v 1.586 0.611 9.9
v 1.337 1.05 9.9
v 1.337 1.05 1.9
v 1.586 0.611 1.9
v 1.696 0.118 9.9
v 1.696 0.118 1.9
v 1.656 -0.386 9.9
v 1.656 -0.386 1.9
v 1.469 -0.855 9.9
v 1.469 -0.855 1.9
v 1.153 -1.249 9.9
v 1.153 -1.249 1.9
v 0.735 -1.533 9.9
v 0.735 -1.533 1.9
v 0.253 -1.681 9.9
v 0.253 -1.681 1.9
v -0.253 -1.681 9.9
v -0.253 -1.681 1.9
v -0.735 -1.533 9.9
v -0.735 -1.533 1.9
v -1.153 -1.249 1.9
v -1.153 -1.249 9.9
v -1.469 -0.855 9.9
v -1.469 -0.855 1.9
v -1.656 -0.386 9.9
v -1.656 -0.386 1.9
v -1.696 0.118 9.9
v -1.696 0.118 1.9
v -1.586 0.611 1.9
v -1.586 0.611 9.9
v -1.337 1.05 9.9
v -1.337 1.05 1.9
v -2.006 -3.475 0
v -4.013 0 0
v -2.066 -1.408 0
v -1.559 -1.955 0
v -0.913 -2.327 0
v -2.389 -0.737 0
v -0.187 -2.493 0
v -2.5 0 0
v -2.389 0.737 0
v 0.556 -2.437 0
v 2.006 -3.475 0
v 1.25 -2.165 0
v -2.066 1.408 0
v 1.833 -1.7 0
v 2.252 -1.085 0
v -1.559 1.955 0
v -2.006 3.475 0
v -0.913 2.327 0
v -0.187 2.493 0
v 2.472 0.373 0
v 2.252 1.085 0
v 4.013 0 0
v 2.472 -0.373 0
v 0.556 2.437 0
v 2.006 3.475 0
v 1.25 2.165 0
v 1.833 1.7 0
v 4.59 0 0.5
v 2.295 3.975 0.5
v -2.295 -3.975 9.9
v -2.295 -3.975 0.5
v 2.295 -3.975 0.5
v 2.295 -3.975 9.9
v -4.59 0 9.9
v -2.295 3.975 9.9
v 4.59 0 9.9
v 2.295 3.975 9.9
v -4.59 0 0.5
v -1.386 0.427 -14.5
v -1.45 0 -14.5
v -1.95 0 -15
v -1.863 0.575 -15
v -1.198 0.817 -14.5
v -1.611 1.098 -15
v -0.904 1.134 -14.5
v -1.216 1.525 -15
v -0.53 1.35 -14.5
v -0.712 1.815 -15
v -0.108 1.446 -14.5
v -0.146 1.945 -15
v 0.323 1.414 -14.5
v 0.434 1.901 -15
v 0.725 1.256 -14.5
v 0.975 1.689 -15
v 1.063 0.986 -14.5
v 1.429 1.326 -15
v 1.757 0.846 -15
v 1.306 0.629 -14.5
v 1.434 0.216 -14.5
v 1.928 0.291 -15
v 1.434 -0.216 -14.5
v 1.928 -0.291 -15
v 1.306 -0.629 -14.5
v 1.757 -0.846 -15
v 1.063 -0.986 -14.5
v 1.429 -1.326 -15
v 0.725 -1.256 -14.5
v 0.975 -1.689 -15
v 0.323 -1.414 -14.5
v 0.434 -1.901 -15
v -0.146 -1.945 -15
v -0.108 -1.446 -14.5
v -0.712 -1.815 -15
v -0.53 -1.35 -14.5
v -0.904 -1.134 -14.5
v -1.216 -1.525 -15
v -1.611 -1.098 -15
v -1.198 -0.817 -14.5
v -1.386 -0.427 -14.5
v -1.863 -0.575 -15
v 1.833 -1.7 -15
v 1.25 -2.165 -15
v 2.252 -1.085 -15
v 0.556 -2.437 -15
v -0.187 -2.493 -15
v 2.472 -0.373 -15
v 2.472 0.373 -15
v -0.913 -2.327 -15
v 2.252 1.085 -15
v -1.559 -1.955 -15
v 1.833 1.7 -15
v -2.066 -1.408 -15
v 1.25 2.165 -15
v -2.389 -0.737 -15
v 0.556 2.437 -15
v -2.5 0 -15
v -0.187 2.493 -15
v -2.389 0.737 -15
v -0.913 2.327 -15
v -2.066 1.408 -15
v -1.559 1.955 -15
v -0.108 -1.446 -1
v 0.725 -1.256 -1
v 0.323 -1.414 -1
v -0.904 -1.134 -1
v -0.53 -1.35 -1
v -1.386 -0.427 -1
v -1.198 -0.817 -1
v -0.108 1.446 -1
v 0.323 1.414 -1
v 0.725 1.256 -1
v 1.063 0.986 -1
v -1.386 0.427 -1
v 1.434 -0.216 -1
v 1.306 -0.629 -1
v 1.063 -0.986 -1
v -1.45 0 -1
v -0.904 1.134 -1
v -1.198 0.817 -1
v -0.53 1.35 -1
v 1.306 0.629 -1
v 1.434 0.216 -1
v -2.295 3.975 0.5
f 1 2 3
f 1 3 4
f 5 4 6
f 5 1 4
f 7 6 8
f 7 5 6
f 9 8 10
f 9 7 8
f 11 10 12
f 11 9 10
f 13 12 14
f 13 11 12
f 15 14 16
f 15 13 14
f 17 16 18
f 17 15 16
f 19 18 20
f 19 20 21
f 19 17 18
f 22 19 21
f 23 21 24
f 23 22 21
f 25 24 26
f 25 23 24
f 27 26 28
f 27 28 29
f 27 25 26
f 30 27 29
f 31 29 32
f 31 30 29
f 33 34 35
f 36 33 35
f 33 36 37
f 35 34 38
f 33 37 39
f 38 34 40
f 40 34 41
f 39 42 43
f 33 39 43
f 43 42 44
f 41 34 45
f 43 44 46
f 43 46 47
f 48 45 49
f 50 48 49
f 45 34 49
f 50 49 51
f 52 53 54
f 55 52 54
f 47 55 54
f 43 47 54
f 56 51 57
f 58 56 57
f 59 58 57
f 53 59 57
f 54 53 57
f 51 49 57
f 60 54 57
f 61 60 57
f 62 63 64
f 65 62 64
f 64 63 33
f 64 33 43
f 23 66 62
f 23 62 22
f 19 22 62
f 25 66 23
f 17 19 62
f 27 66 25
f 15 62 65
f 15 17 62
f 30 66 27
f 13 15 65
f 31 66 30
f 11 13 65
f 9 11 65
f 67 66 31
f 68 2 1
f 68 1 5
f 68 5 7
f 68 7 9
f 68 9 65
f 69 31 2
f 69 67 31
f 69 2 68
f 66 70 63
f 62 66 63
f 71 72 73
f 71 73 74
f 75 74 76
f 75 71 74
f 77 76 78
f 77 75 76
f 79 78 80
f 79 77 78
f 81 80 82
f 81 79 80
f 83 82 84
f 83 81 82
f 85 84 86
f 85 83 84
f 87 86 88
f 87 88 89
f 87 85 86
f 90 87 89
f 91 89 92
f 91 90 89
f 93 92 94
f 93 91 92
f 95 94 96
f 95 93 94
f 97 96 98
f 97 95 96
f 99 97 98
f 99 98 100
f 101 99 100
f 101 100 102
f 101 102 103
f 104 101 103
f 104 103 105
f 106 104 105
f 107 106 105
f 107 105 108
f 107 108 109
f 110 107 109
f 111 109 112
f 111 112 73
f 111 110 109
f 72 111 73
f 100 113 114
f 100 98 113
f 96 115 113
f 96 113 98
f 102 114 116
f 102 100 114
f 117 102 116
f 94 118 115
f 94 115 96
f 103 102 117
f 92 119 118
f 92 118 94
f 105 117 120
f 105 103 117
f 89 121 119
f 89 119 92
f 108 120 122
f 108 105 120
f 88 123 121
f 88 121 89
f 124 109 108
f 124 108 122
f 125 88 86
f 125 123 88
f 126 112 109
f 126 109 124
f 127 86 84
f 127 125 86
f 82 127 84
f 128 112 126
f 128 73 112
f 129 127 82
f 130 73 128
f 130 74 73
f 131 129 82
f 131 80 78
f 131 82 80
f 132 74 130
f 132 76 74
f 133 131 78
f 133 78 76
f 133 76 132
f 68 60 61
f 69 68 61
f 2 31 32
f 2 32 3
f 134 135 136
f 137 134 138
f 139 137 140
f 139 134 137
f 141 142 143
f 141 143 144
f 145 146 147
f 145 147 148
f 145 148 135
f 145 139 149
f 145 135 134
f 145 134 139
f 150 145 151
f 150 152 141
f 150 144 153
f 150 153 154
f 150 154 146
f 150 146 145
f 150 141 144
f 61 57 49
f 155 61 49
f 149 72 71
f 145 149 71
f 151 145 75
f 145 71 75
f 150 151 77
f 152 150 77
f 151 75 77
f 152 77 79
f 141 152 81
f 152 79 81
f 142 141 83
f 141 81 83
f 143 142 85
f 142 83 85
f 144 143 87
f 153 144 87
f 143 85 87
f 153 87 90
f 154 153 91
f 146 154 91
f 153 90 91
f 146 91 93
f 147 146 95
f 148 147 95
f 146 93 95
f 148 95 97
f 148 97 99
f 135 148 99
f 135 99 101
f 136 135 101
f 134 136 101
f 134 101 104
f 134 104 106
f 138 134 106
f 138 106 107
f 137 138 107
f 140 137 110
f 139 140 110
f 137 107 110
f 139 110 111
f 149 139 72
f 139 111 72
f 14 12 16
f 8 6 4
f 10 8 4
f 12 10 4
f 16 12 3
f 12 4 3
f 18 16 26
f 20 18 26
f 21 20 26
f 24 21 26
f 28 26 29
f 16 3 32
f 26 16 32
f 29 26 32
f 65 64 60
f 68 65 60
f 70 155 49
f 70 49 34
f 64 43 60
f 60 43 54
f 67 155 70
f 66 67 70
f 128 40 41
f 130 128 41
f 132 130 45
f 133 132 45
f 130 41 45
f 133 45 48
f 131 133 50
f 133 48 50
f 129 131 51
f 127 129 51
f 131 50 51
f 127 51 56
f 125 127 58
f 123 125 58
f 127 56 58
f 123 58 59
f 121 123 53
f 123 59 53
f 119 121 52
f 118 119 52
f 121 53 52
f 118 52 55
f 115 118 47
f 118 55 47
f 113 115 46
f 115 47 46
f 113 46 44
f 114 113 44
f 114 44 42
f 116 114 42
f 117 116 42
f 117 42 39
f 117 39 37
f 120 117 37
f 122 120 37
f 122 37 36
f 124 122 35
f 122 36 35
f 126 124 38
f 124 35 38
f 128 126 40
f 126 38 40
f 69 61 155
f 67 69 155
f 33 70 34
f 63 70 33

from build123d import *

# Parameters (mm, degrees)
SALIENTE_EXTRUIR1_DEPTH = 9.9
CORTAR_EXTRUIR1_DEPTH   = 8
CROQUIS3_R              = 2.5
SALIENTE_EXTRUIR2_DEPTH = 15
CROQUIS4_R              = 1.45
CORTAR_EXTRUIR2_DEPTH   = 14
CHAFL_N1_SIZE           = 0.5
CHAFL_N2_SIZE           = 0.5


with BuildPart() as part:
    # Croquis1 → Saliente-Extruir1 (new body)
    with BuildSketch(Plane.XY):
        Polygon((4.58993464, 0), (2.29496732, 3.975), (-2.29496732, 3.975), (-4.58993464, 0), (-2.29496732, -3.975), (2.29496732, -3.975), align=None)
    extrude(amount=SALIENTE_EXTRUIR1_DEPTH)

    # Croquis2 → Cortar-Extruir1 (cut)
    with BuildSketch(Plane.XY.offset(9.9)):
        with BuildLine():
            Line((-1.336974196, 1.05), (1.336974196, 1.05))
            ThreePointArc((1.336974196, 1.05), (0, -1.7), (-1.336974196, 1.05))
        make_face()
    extrude(amount=-CORTAR_EXTRUIR1_DEPTH, mode=Mode.SUBTRACT)

    # Croquis3 → Saliente-Extruir2 (add)
    with BuildSketch(Plane(origin=(0, 0, 0), x_dir=(-1, 0, 0), z_dir=(0, 0, -1))):
        Circle(CROQUIS3_R)
    extrude(amount=SALIENTE_EXTRUIR2_DEPTH)

    # Croquis4 → Cortar-Extruir2 (cut)
    with BuildSketch(Plane(origin=(0, 0, -15), x_dir=(-1, 0, 0), z_dir=(0, 0, -1))):
        Circle(CROQUIS4_R)
    extrude(amount=-CORTAR_EXTRUIR2_DEPTH, mode=Mode.SUBTRACT)

    # Chaflán1
    chafl_n1_edges = [part.edges().sort_by_distance(p)[0] for p in [
        (0, -3.975, 0),
        (-3.44245098, -1.9875, 0),
        (-3.44245098, 1.9875, 0),
        (0, 3.975, 0),
        (3.44245098, 1.9875, 0),
        (3.44245098, -1.9875, 0),
    ]]
    chamfer(chafl_n1_edges, length=CHAFL_N1_SIZE)

    # Chaflán2
    chafl_n2_edges = [part.edges().sort_by_distance(p)[0] for p in [
        (1.45, 0, -15),
    ]]
    chamfer(chafl_n2_edges, length=CHAFL_N2_SIZE)


solid = part.part
